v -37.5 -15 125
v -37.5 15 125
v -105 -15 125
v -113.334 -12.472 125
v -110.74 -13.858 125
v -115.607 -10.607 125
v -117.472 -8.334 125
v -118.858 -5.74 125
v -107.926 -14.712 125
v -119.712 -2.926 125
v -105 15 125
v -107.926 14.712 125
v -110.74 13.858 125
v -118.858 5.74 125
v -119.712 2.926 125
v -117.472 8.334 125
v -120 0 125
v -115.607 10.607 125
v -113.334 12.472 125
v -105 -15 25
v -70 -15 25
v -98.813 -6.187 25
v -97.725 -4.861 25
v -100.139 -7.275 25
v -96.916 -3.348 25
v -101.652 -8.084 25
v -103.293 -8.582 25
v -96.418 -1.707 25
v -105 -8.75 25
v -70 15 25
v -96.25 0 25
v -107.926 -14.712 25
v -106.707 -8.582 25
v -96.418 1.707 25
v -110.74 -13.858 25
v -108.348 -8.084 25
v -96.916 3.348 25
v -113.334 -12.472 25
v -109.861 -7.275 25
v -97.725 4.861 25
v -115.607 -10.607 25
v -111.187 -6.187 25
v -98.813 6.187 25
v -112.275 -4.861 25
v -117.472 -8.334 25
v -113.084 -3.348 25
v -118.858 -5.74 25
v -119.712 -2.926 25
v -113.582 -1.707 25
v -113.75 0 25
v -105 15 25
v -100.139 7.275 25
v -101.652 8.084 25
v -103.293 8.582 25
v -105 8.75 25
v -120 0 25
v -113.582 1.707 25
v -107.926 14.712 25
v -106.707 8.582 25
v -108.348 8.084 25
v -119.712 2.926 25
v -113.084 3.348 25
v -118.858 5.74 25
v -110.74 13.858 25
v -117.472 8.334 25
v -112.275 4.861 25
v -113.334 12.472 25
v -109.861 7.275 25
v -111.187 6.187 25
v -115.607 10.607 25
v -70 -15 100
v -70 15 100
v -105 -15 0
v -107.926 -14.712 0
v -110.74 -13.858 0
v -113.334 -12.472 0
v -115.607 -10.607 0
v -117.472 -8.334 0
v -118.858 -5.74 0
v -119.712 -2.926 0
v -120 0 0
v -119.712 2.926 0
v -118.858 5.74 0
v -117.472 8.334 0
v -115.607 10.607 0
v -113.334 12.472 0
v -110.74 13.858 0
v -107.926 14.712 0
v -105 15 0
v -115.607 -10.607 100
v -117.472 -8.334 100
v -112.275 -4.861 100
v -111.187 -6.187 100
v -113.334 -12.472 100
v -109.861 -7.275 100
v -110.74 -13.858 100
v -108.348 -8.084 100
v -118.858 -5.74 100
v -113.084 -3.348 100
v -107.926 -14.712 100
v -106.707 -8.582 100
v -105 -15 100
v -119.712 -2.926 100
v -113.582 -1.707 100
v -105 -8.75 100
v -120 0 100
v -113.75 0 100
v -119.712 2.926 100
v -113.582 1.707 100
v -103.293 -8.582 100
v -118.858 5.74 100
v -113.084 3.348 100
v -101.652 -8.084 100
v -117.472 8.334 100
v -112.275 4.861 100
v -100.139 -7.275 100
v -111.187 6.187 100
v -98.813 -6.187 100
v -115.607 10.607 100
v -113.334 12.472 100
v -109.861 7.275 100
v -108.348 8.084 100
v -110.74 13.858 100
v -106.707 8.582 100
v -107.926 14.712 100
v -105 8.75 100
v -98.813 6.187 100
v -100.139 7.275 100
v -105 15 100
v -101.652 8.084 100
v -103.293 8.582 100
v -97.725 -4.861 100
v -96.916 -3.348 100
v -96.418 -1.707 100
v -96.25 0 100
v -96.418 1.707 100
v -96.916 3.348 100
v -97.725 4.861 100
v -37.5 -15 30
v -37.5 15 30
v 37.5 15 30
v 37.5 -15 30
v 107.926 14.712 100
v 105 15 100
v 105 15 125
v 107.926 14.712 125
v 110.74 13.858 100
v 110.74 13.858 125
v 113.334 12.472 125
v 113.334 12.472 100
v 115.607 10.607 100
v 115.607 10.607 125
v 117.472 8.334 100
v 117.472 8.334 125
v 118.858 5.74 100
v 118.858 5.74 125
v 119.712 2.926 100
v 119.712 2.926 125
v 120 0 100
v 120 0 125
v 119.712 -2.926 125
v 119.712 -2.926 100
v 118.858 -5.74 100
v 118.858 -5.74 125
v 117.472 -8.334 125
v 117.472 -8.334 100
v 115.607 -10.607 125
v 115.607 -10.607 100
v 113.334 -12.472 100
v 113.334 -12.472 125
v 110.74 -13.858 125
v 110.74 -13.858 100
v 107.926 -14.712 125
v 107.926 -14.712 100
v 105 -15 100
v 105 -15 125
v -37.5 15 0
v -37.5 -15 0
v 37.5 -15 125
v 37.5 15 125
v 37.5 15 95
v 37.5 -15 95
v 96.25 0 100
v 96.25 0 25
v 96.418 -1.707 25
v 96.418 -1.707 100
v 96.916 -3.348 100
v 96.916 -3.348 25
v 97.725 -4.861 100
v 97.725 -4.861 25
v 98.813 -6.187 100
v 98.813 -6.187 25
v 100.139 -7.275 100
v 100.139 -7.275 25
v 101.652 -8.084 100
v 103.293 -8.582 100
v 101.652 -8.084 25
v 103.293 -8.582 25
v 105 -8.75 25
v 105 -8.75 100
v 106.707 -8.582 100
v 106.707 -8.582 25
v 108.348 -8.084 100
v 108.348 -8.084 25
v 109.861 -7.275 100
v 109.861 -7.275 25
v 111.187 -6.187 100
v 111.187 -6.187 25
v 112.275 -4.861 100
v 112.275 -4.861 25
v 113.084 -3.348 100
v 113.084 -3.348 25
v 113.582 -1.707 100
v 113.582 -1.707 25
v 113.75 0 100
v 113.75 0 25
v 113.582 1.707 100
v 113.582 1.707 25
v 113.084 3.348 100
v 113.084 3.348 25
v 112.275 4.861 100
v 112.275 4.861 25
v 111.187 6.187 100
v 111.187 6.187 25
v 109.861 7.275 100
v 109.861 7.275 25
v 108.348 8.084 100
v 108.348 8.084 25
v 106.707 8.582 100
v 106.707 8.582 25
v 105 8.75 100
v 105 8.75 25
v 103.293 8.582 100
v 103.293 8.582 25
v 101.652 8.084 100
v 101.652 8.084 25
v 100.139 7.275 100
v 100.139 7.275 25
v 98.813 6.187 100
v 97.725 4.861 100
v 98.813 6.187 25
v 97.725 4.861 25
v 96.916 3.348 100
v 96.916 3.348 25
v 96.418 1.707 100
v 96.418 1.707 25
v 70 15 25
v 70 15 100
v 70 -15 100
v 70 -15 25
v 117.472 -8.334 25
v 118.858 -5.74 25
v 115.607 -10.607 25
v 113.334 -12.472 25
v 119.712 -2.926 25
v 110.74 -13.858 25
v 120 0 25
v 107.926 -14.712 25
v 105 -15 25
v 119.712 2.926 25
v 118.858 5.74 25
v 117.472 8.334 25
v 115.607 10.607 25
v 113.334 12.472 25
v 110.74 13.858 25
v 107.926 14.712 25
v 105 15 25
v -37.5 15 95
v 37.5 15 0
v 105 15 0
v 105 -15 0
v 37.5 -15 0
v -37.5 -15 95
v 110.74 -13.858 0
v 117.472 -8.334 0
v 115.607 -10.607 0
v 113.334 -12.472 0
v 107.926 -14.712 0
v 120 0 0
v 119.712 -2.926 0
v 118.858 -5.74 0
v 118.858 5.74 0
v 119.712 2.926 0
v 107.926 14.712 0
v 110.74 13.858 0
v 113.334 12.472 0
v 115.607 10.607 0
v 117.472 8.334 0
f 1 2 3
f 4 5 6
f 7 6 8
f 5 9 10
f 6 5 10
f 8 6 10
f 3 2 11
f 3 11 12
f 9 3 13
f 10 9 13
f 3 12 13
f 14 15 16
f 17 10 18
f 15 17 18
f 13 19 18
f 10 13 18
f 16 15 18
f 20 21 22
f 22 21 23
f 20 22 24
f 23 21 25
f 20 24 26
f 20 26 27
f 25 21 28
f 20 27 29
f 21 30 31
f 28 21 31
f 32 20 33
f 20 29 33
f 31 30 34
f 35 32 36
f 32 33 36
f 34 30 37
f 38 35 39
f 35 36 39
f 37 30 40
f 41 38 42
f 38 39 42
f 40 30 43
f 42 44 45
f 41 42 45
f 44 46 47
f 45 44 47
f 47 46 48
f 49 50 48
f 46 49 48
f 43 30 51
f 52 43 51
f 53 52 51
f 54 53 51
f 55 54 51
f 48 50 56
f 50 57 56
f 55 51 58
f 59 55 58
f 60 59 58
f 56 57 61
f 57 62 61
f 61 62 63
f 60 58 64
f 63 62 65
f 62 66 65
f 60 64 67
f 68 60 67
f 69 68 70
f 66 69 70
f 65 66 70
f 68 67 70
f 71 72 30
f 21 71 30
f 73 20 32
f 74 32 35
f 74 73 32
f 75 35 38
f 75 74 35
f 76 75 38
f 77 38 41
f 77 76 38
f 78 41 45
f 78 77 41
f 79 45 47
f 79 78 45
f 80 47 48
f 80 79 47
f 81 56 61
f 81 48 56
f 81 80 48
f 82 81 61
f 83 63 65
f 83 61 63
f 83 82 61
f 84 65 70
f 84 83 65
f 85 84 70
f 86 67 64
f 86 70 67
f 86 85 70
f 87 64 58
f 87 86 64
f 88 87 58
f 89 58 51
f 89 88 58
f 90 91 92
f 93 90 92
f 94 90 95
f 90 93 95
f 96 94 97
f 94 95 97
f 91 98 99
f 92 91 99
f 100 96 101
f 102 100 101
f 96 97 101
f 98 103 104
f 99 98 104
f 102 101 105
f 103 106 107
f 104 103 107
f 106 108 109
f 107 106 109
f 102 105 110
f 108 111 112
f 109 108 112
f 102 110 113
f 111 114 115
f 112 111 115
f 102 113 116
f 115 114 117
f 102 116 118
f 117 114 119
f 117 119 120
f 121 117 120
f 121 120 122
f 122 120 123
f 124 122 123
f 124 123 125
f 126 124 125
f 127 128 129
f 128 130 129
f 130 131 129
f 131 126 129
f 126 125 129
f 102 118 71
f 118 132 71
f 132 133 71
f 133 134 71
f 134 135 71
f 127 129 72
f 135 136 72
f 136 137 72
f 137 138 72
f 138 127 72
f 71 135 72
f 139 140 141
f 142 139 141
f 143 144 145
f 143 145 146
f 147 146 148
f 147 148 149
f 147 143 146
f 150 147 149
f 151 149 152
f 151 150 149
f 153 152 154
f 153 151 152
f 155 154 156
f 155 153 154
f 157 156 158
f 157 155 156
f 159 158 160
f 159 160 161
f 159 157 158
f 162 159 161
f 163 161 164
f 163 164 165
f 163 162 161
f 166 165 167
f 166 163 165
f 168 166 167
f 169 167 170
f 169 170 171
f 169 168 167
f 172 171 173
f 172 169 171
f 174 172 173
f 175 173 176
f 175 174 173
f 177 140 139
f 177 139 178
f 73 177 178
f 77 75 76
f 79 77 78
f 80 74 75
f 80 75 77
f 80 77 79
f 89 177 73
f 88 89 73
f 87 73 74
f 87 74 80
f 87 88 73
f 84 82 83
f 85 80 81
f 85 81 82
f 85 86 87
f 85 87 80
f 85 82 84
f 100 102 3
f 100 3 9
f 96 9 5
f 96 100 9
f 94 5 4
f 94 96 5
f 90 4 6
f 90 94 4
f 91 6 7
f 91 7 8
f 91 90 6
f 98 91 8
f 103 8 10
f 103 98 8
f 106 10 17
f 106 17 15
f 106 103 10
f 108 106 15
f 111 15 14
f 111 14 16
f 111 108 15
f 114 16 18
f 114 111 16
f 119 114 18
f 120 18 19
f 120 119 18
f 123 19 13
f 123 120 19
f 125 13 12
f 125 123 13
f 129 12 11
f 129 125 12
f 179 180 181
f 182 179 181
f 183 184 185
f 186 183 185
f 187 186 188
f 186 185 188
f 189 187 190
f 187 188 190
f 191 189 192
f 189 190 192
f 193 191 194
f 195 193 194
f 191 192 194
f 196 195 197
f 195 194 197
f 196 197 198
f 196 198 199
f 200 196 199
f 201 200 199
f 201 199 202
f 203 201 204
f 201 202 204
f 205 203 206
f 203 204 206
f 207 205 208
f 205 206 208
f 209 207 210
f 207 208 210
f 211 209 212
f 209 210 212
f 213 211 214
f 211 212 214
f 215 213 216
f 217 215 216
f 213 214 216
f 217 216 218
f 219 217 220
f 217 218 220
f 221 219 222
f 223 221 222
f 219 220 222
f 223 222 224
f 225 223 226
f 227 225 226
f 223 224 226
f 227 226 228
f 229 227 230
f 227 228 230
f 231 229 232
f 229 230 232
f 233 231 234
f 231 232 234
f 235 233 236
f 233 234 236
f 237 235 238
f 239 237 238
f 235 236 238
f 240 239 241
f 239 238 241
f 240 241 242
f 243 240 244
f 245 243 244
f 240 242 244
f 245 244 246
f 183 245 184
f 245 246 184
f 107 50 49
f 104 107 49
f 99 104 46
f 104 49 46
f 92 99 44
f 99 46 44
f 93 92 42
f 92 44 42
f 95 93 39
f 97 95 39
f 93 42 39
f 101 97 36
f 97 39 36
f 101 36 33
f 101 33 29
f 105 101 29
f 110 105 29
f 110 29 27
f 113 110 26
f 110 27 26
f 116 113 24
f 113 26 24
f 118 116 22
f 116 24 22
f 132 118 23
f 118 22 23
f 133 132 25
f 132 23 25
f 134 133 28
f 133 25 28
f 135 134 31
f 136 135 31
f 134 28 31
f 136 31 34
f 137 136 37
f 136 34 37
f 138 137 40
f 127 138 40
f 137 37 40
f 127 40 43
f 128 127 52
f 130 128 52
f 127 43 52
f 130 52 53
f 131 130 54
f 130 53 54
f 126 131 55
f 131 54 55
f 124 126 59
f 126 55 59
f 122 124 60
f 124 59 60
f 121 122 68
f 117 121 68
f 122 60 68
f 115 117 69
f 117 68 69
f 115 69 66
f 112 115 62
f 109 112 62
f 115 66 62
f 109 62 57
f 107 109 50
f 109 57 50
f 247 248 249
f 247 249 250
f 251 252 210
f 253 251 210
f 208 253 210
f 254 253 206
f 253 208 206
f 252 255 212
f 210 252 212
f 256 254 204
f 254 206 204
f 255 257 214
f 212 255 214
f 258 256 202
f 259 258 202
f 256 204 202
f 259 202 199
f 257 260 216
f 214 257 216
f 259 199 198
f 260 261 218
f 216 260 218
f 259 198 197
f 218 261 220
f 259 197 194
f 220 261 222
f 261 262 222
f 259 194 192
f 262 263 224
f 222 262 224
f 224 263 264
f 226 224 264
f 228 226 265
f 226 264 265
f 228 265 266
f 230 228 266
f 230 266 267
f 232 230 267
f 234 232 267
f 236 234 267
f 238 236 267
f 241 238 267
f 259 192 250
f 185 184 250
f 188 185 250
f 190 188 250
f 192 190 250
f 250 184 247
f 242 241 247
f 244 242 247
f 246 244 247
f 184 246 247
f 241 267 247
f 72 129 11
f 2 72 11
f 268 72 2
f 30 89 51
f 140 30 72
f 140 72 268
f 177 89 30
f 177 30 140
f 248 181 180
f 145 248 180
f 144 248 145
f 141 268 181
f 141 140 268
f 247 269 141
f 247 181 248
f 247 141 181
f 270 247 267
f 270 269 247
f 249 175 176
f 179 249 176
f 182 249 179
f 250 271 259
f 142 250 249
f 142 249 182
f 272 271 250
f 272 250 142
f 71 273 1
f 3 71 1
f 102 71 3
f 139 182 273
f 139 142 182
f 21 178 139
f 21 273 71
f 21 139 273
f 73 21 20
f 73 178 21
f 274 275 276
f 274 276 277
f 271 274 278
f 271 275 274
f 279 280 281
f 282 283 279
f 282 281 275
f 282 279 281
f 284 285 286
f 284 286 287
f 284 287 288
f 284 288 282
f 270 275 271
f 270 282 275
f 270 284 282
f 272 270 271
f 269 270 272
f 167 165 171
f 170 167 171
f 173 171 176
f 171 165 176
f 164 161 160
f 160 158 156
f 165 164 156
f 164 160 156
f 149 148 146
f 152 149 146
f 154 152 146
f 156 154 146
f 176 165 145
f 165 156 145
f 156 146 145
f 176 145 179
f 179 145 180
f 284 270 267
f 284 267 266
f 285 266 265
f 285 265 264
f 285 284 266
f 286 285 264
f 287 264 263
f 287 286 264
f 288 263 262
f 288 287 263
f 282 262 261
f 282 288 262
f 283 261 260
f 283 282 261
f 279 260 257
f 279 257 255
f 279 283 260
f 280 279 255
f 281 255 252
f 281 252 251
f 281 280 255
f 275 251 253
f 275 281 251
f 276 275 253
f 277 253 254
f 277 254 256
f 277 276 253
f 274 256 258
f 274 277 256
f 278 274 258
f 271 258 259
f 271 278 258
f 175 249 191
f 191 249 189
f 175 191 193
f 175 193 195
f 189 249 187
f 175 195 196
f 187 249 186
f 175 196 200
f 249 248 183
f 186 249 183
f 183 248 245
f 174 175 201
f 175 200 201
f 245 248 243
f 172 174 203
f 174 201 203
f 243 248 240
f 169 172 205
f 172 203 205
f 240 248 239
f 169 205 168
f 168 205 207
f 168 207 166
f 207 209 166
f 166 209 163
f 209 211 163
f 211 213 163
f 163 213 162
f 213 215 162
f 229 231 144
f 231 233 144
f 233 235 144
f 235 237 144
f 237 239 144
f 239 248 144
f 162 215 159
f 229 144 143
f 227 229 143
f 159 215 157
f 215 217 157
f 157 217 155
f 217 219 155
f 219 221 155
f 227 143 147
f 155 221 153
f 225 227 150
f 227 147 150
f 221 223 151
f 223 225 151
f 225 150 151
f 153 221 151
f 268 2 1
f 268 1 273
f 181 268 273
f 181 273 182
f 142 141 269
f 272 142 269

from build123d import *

# Parameters (mm, degrees)
BOSS_EXTRUDE1_DEPTH = 125
SKETCH2_W           = 35
SKETCH2_H           = 75
SKETCH2_W_2         = 15
CUT_EXTRUDE1_DEPTH  = 100
SKETCH3_R           = 8.75
BOSS_EXTRUDE2_DEPTH = 75
SKETCH4_W           = 75
SKETCH4_H           = 30
CUT_EXTRUDE2_DEPTH  = 176.855053951


with BuildPart() as part:
    # Sketch1 → Boss-Extrude1 (new body)
    with BuildSketch(Plane.XY):
        with BuildLine():
            Line((-105, 15), (105, 15))
            ThreePointArc((105, 15), (120, 0), (105, -15))
            Line((105, -15), (-105, -15))
            ThreePointArc((-105, -15), (-120, 0), (-105, 15))
        make_face()
    extrude(amount=BOSS_EXTRUDE1_DEPTH)

    # Sketch2 → Cut-Extrude1 (cut)
    with BuildSketch(Plane(origin=(0, 15, 0), x_dir=(1, 0, 0), z_dir=(0, 1, 0))):
        with Locations((-87.5, -62.5)):
            Rectangle(SKETCH2_W, SKETCH2_H)
        with Locations((-112.5, -62.5)):
            Rectangle(SKETCH2_W_2, SKETCH2_H)
        with Locations((112.5, -62.5)):
            Rectangle(SKETCH2_W_2, SKETCH2_H)
        with Locations((87.5, -62.5)):
            Rectangle(SKETCH2_W, SKETCH2_H)
    extrude(amount=-CUT_EXTRUDE1_DEPTH, mode=Mode.SUBTRACT)

    # Sketch3 → Boss-Extrude2 (add)
    with BuildSketch(Plane.XY.offset(25)):
        with Locations(Location((-105, 0, 0), (0, 0, 180))):
            Circle(SKETCH3_R)
        with Locations(Location((105, 0, 0), (0, 0, 180))):
            Circle(SKETCH3_R)
    extrude(amount=BOSS_EXTRUDE2_DEPTH)

    # Sketch4 → Cut-Extrude2 (cut, through all)
    with BuildSketch(Plane(origin=(0, 15, 0), x_dir=(1, 0, 0), z_dir=(0, 1, 0))):
        with Locations((0, -15)):
            Rectangle(SKETCH4_W, SKETCH4_H)
        with Locations((0, -110)):
            Rectangle(SKETCH4_W, SKETCH4_H)
    extrude(amount=-CUT_EXTRUDE2_DEPTH, mode=Mode.SUBTRACT)


solid = part.part
